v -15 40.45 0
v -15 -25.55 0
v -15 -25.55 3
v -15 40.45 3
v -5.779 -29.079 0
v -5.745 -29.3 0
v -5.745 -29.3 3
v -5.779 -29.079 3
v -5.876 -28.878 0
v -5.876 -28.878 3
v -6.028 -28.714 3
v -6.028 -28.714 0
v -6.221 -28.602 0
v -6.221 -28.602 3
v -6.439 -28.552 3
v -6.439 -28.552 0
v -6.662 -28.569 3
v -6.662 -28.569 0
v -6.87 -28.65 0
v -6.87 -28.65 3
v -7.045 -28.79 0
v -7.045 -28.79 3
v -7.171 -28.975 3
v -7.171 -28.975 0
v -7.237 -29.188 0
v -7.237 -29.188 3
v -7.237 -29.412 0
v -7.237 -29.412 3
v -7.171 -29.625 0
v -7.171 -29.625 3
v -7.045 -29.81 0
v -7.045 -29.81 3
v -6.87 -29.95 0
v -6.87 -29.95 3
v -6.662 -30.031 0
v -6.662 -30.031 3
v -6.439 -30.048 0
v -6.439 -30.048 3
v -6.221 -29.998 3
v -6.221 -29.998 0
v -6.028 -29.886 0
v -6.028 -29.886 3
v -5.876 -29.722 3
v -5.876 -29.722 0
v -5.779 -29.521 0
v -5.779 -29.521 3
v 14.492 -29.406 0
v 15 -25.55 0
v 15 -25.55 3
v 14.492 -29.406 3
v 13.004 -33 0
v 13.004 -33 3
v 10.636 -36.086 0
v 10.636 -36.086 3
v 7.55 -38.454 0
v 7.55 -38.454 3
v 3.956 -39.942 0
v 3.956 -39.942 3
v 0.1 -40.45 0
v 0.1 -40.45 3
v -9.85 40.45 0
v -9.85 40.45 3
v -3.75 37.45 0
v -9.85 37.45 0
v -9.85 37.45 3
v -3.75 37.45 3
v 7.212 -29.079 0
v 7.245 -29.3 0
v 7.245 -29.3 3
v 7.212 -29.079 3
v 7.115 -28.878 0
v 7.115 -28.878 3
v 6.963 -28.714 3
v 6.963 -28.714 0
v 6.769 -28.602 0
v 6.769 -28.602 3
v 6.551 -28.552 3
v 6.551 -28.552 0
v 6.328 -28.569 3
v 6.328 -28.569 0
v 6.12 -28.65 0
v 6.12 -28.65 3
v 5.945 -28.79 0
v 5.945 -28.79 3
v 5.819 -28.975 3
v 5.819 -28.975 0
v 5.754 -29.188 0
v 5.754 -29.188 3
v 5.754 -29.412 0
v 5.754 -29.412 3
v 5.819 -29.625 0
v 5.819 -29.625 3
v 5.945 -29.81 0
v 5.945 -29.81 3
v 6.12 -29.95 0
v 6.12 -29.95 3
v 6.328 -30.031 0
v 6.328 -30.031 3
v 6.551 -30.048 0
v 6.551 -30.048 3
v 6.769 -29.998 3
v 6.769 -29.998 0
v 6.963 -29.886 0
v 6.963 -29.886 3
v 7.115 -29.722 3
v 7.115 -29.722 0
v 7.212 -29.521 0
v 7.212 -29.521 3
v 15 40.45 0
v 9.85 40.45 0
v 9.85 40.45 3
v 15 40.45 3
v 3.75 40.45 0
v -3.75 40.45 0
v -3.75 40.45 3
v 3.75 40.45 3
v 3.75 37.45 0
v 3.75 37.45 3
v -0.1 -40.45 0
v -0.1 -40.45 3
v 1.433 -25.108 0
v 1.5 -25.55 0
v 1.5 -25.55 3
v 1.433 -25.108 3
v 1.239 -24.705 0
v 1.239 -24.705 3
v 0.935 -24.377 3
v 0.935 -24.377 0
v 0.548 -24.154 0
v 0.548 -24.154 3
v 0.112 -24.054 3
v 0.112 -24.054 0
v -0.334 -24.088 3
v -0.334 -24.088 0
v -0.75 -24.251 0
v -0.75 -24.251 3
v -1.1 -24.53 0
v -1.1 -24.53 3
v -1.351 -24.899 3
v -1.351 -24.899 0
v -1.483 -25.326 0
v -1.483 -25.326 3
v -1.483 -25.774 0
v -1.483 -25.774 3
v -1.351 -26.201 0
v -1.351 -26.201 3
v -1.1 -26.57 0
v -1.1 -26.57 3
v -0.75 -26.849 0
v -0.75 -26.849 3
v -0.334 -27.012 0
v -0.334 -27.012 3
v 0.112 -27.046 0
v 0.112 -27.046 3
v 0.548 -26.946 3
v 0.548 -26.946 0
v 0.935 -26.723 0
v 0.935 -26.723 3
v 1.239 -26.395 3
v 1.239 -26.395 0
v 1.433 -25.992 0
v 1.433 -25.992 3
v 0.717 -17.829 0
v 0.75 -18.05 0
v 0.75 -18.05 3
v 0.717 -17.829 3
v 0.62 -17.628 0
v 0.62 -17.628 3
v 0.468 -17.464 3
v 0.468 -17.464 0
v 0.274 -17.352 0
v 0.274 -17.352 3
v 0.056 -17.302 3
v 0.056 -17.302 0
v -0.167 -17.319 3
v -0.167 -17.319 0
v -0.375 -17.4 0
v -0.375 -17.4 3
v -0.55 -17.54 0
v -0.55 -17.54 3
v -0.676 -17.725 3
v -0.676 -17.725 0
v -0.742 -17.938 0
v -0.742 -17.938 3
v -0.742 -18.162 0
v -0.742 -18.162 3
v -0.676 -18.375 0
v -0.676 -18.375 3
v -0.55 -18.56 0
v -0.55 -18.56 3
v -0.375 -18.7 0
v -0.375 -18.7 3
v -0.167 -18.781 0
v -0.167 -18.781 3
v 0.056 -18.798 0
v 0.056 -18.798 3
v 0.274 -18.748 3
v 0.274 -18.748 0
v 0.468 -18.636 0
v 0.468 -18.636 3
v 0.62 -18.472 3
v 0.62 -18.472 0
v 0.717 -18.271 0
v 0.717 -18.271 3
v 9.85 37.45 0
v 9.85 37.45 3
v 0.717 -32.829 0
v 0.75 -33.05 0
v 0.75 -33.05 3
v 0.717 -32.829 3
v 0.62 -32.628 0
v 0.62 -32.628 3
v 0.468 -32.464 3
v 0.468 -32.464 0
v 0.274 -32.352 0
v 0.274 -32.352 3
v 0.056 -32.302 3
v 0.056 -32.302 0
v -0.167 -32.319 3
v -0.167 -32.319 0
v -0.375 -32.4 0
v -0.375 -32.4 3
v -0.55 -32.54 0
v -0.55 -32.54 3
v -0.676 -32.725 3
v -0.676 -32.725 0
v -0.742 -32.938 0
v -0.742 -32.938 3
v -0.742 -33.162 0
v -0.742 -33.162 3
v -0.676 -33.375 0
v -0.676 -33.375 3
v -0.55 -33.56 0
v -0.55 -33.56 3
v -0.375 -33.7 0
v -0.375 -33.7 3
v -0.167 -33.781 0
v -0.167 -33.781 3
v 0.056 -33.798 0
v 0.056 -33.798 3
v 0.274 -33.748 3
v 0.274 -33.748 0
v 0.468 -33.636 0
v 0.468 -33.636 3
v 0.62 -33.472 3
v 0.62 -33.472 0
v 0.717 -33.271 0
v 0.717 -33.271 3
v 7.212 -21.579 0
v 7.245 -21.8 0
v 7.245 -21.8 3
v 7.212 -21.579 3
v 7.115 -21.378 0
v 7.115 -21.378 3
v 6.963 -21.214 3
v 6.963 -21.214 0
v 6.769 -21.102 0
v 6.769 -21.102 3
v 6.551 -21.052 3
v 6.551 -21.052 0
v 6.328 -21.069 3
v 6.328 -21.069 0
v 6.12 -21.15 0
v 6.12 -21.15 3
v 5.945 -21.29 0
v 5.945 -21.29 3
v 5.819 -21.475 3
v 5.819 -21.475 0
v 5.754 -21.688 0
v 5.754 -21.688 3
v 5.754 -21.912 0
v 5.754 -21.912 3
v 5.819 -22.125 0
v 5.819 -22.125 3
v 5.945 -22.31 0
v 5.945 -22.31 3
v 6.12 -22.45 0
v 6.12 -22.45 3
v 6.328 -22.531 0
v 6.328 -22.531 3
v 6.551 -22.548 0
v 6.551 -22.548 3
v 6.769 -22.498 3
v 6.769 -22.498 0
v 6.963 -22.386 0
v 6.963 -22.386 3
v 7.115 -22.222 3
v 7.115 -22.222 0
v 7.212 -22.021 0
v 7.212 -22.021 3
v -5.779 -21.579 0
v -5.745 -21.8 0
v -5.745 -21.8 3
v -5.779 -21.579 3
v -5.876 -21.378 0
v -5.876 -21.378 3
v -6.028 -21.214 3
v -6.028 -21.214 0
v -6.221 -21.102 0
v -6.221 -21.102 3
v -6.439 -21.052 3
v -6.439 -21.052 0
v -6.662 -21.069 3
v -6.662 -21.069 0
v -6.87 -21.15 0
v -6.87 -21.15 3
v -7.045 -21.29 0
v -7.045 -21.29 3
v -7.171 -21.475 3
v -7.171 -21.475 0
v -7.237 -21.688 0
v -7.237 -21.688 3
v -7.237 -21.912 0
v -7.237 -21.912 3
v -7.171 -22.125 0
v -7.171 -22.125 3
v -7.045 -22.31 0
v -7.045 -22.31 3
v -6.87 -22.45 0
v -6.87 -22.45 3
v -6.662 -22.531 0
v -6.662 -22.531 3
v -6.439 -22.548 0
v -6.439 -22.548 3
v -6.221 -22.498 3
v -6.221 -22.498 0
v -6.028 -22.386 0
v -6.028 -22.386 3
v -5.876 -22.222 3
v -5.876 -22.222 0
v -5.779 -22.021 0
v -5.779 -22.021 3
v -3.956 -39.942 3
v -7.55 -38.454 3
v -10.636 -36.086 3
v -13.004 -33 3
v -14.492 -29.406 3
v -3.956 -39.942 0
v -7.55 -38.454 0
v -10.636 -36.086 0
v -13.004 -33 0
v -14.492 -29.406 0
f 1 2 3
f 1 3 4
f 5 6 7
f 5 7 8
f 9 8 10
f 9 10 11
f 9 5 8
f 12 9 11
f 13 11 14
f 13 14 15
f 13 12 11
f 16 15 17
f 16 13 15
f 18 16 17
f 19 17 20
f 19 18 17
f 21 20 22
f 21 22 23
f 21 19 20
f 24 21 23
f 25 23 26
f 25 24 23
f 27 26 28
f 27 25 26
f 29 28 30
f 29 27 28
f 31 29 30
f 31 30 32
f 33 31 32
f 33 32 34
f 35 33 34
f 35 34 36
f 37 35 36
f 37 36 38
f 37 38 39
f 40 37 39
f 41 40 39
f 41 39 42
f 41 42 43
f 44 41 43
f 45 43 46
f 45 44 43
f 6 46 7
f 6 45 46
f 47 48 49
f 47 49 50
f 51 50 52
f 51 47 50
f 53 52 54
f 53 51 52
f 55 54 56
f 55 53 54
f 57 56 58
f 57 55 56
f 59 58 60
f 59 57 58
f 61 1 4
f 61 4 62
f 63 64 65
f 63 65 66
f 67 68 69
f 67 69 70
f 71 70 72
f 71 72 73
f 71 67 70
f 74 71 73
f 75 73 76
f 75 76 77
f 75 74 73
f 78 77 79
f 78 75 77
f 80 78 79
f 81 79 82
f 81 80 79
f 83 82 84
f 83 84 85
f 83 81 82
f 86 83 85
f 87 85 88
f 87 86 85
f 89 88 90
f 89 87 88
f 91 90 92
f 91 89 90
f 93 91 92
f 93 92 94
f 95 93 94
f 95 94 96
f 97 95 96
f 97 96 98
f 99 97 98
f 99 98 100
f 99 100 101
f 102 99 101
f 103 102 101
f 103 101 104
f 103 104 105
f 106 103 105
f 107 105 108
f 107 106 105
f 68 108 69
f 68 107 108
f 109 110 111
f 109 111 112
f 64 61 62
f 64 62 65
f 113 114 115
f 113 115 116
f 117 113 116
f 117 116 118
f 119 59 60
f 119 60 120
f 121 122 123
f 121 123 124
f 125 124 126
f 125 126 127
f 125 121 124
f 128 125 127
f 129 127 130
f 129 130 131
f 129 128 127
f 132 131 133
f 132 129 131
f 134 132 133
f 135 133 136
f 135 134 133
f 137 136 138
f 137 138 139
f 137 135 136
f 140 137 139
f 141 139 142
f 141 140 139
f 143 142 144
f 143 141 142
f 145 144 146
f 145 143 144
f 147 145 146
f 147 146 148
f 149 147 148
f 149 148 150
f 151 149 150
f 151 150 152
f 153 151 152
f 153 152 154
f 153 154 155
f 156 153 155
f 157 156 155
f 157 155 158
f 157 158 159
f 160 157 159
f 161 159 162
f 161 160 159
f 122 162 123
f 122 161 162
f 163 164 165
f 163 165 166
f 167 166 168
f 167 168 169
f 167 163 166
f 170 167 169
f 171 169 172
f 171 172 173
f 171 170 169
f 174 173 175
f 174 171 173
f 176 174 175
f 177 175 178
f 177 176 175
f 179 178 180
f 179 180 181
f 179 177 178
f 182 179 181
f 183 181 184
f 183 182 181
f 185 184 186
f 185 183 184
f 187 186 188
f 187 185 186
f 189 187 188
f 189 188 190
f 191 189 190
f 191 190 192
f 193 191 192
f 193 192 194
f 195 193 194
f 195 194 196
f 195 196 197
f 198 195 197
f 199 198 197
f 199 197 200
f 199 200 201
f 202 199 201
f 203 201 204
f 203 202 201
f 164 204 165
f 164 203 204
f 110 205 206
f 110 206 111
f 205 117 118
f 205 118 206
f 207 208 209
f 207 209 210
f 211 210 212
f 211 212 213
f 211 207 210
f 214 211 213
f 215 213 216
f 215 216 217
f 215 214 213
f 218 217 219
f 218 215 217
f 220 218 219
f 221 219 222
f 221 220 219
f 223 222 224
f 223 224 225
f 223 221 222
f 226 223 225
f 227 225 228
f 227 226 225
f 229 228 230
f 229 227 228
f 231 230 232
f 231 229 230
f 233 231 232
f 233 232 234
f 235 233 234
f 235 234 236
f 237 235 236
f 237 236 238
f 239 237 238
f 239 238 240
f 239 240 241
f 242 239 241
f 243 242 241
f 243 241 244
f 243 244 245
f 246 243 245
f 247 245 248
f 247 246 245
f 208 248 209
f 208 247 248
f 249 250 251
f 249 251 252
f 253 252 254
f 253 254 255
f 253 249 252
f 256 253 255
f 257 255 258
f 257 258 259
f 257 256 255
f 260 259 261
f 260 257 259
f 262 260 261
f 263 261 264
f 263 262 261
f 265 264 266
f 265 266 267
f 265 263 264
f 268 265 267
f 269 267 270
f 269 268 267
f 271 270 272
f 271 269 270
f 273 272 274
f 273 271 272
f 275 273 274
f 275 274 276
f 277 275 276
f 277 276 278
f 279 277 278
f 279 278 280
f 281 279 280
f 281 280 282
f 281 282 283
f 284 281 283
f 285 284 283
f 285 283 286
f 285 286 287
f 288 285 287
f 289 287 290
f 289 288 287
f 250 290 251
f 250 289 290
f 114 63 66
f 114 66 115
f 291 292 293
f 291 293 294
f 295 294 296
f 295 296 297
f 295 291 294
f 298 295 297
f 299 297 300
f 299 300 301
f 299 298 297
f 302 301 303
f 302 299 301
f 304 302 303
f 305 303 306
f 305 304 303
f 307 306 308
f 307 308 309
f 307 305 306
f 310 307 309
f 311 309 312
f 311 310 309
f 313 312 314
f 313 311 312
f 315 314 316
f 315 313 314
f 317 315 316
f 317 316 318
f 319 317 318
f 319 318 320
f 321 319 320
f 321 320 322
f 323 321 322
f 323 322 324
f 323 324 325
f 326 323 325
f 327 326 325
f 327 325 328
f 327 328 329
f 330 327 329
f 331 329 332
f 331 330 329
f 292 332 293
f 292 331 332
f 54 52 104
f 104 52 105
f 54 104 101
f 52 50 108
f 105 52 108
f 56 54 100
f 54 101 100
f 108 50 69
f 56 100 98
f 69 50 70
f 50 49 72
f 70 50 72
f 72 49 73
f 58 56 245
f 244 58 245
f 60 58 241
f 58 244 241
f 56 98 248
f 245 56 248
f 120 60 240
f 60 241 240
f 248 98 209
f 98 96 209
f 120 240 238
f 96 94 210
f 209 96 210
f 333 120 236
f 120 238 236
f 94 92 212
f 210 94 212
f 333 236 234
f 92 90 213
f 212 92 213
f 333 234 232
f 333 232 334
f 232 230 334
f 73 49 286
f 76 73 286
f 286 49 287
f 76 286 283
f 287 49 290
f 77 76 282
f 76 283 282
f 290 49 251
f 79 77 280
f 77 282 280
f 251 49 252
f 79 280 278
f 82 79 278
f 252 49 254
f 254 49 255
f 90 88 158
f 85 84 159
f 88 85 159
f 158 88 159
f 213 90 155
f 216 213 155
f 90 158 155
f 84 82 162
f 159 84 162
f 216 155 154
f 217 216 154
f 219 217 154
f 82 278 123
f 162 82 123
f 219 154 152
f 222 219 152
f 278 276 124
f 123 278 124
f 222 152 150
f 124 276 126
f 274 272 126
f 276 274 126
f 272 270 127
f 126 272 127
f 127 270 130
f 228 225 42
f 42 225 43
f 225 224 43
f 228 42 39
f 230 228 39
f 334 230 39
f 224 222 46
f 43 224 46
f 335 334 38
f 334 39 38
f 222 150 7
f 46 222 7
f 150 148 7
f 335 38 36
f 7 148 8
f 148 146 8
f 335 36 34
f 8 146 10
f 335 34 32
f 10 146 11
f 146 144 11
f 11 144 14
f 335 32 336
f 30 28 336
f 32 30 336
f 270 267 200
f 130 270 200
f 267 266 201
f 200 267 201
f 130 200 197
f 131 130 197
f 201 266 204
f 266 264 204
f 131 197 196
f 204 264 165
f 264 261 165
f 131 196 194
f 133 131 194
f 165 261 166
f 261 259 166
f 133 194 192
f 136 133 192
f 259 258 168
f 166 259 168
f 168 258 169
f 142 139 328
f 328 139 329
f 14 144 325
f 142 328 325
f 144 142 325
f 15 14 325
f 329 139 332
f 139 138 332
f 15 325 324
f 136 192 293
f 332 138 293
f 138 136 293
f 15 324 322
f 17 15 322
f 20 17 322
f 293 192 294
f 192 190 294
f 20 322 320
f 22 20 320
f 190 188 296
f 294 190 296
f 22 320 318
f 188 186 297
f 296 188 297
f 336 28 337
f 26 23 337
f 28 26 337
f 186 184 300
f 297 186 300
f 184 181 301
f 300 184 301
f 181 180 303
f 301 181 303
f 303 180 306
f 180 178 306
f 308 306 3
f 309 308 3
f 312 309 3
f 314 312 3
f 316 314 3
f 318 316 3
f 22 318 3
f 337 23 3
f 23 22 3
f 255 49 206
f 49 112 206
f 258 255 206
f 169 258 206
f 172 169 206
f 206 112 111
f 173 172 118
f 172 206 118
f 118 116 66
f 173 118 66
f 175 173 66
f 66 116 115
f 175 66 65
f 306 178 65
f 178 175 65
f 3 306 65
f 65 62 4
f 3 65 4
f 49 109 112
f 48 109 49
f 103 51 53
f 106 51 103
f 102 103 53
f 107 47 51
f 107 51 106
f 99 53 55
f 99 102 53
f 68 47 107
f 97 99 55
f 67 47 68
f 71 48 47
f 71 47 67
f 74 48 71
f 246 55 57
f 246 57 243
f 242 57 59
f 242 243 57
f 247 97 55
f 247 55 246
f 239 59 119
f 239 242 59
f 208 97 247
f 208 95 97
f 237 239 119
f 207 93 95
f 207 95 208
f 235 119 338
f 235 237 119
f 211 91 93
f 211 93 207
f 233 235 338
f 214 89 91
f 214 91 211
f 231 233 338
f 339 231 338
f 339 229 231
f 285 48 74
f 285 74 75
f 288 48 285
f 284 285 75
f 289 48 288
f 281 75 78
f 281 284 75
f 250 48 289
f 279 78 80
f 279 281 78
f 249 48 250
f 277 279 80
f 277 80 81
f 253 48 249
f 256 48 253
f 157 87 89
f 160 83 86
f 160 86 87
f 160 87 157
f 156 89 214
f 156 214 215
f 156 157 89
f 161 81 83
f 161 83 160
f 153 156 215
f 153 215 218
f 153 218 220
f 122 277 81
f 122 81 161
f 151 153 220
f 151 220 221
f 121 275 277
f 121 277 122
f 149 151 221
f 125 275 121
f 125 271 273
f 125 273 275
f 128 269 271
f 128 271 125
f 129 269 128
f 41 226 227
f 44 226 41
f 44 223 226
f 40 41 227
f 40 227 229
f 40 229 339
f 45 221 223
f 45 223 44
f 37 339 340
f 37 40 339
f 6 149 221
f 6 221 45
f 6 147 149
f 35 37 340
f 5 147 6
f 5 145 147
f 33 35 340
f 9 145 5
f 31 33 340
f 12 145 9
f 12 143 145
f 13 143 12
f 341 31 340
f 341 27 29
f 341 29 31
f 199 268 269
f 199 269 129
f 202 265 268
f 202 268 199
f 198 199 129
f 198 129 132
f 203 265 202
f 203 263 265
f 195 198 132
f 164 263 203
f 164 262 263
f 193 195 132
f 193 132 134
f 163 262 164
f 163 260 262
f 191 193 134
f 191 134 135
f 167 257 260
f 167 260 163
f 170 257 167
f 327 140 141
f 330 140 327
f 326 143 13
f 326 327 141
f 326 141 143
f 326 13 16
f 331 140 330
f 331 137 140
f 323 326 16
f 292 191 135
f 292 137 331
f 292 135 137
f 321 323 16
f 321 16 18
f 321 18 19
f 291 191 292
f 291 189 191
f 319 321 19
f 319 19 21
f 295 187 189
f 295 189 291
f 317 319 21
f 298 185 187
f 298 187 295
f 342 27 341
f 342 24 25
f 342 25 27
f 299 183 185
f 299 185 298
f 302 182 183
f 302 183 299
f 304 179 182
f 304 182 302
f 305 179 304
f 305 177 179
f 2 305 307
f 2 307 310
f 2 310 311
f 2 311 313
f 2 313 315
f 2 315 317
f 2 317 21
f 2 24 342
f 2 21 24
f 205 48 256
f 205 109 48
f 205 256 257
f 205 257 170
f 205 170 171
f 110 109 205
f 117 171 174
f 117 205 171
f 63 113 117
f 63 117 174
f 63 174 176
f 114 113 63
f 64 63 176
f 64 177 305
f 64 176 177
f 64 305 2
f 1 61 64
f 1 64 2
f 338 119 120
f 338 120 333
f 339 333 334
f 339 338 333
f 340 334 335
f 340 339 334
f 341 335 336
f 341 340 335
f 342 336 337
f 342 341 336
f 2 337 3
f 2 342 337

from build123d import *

# Parameters (mm, degrees)
SKETCH2_R           = 0.75
SKETCH2_R_2         = 1.5
BOSS_EXTRUDE1_DEPTH = 3


with BuildPart() as part:
    # Sketch2 → Boss-Extrude1 (new body)
    with BuildSketch(Plane.XY):
        with BuildLine():
            Line((-9.85, 40.45), (-9.85, 37.45))
            Line((-9.85, 37.45), (-3.75, 37.45))
            Line((-3.75, 37.45), (-3.75, 40.45))
            Line((-3.75, 40.45), (3.75, 40.45))
            Line((3.75, 40.45), (3.75, 37.45))
            Line((3.75, 37.45), (9.85, 37.45))
            Line((9.85, 37.45), (9.85, 40.45))
            Line((9.85, 40.45), (15, 40.45))
            Line((15, 40.45), (15, -25.55))
            ThreePointArc((15, -25.55), (10.63589104, -36.08589104), (0.1, -40.45))
            Line((0.1, -40.45), (-0.1, -40.45))
            ThreePointArc((-0.1, -40.45), (-10.63589104, -36.08589104), (-15, -25.55))
            Line((-15, -25.55), (-15, 40.45))
            Line((-15, 40.45), (-9.85, 40.45))
        make_face()
        with Locations((0, -18.05)):
            Circle(SKETCH2_R, mode=Mode.SUBTRACT)
        with Locations((6.495190528, -21.8)):
            Circle(SKETCH2_R, mode=Mode.SUBTRACT)
        with Locations((6.495190528, -29.3)):
            Circle(SKETCH2_R, mode=Mode.SUBTRACT)
        with Locations((0, -33.05)):
            Circle(SKETCH2_R, mode=Mode.SUBTRACT)
        with Locations((-6.495190528, -29.3)):
            Circle(SKETCH2_R, mode=Mode.SUBTRACT)
        with Locations((-6.495190528, -21.8)):
            Circle(SKETCH2_R, mode=Mode.SUBTRACT)
        with Locations((0, -25.55)):
            Circle(SKETCH2_R_2, mode=Mode.SUBTRACT)
    extrude(amount=BOSS_EXTRUDE1_DEPTH)


solid = part.part
